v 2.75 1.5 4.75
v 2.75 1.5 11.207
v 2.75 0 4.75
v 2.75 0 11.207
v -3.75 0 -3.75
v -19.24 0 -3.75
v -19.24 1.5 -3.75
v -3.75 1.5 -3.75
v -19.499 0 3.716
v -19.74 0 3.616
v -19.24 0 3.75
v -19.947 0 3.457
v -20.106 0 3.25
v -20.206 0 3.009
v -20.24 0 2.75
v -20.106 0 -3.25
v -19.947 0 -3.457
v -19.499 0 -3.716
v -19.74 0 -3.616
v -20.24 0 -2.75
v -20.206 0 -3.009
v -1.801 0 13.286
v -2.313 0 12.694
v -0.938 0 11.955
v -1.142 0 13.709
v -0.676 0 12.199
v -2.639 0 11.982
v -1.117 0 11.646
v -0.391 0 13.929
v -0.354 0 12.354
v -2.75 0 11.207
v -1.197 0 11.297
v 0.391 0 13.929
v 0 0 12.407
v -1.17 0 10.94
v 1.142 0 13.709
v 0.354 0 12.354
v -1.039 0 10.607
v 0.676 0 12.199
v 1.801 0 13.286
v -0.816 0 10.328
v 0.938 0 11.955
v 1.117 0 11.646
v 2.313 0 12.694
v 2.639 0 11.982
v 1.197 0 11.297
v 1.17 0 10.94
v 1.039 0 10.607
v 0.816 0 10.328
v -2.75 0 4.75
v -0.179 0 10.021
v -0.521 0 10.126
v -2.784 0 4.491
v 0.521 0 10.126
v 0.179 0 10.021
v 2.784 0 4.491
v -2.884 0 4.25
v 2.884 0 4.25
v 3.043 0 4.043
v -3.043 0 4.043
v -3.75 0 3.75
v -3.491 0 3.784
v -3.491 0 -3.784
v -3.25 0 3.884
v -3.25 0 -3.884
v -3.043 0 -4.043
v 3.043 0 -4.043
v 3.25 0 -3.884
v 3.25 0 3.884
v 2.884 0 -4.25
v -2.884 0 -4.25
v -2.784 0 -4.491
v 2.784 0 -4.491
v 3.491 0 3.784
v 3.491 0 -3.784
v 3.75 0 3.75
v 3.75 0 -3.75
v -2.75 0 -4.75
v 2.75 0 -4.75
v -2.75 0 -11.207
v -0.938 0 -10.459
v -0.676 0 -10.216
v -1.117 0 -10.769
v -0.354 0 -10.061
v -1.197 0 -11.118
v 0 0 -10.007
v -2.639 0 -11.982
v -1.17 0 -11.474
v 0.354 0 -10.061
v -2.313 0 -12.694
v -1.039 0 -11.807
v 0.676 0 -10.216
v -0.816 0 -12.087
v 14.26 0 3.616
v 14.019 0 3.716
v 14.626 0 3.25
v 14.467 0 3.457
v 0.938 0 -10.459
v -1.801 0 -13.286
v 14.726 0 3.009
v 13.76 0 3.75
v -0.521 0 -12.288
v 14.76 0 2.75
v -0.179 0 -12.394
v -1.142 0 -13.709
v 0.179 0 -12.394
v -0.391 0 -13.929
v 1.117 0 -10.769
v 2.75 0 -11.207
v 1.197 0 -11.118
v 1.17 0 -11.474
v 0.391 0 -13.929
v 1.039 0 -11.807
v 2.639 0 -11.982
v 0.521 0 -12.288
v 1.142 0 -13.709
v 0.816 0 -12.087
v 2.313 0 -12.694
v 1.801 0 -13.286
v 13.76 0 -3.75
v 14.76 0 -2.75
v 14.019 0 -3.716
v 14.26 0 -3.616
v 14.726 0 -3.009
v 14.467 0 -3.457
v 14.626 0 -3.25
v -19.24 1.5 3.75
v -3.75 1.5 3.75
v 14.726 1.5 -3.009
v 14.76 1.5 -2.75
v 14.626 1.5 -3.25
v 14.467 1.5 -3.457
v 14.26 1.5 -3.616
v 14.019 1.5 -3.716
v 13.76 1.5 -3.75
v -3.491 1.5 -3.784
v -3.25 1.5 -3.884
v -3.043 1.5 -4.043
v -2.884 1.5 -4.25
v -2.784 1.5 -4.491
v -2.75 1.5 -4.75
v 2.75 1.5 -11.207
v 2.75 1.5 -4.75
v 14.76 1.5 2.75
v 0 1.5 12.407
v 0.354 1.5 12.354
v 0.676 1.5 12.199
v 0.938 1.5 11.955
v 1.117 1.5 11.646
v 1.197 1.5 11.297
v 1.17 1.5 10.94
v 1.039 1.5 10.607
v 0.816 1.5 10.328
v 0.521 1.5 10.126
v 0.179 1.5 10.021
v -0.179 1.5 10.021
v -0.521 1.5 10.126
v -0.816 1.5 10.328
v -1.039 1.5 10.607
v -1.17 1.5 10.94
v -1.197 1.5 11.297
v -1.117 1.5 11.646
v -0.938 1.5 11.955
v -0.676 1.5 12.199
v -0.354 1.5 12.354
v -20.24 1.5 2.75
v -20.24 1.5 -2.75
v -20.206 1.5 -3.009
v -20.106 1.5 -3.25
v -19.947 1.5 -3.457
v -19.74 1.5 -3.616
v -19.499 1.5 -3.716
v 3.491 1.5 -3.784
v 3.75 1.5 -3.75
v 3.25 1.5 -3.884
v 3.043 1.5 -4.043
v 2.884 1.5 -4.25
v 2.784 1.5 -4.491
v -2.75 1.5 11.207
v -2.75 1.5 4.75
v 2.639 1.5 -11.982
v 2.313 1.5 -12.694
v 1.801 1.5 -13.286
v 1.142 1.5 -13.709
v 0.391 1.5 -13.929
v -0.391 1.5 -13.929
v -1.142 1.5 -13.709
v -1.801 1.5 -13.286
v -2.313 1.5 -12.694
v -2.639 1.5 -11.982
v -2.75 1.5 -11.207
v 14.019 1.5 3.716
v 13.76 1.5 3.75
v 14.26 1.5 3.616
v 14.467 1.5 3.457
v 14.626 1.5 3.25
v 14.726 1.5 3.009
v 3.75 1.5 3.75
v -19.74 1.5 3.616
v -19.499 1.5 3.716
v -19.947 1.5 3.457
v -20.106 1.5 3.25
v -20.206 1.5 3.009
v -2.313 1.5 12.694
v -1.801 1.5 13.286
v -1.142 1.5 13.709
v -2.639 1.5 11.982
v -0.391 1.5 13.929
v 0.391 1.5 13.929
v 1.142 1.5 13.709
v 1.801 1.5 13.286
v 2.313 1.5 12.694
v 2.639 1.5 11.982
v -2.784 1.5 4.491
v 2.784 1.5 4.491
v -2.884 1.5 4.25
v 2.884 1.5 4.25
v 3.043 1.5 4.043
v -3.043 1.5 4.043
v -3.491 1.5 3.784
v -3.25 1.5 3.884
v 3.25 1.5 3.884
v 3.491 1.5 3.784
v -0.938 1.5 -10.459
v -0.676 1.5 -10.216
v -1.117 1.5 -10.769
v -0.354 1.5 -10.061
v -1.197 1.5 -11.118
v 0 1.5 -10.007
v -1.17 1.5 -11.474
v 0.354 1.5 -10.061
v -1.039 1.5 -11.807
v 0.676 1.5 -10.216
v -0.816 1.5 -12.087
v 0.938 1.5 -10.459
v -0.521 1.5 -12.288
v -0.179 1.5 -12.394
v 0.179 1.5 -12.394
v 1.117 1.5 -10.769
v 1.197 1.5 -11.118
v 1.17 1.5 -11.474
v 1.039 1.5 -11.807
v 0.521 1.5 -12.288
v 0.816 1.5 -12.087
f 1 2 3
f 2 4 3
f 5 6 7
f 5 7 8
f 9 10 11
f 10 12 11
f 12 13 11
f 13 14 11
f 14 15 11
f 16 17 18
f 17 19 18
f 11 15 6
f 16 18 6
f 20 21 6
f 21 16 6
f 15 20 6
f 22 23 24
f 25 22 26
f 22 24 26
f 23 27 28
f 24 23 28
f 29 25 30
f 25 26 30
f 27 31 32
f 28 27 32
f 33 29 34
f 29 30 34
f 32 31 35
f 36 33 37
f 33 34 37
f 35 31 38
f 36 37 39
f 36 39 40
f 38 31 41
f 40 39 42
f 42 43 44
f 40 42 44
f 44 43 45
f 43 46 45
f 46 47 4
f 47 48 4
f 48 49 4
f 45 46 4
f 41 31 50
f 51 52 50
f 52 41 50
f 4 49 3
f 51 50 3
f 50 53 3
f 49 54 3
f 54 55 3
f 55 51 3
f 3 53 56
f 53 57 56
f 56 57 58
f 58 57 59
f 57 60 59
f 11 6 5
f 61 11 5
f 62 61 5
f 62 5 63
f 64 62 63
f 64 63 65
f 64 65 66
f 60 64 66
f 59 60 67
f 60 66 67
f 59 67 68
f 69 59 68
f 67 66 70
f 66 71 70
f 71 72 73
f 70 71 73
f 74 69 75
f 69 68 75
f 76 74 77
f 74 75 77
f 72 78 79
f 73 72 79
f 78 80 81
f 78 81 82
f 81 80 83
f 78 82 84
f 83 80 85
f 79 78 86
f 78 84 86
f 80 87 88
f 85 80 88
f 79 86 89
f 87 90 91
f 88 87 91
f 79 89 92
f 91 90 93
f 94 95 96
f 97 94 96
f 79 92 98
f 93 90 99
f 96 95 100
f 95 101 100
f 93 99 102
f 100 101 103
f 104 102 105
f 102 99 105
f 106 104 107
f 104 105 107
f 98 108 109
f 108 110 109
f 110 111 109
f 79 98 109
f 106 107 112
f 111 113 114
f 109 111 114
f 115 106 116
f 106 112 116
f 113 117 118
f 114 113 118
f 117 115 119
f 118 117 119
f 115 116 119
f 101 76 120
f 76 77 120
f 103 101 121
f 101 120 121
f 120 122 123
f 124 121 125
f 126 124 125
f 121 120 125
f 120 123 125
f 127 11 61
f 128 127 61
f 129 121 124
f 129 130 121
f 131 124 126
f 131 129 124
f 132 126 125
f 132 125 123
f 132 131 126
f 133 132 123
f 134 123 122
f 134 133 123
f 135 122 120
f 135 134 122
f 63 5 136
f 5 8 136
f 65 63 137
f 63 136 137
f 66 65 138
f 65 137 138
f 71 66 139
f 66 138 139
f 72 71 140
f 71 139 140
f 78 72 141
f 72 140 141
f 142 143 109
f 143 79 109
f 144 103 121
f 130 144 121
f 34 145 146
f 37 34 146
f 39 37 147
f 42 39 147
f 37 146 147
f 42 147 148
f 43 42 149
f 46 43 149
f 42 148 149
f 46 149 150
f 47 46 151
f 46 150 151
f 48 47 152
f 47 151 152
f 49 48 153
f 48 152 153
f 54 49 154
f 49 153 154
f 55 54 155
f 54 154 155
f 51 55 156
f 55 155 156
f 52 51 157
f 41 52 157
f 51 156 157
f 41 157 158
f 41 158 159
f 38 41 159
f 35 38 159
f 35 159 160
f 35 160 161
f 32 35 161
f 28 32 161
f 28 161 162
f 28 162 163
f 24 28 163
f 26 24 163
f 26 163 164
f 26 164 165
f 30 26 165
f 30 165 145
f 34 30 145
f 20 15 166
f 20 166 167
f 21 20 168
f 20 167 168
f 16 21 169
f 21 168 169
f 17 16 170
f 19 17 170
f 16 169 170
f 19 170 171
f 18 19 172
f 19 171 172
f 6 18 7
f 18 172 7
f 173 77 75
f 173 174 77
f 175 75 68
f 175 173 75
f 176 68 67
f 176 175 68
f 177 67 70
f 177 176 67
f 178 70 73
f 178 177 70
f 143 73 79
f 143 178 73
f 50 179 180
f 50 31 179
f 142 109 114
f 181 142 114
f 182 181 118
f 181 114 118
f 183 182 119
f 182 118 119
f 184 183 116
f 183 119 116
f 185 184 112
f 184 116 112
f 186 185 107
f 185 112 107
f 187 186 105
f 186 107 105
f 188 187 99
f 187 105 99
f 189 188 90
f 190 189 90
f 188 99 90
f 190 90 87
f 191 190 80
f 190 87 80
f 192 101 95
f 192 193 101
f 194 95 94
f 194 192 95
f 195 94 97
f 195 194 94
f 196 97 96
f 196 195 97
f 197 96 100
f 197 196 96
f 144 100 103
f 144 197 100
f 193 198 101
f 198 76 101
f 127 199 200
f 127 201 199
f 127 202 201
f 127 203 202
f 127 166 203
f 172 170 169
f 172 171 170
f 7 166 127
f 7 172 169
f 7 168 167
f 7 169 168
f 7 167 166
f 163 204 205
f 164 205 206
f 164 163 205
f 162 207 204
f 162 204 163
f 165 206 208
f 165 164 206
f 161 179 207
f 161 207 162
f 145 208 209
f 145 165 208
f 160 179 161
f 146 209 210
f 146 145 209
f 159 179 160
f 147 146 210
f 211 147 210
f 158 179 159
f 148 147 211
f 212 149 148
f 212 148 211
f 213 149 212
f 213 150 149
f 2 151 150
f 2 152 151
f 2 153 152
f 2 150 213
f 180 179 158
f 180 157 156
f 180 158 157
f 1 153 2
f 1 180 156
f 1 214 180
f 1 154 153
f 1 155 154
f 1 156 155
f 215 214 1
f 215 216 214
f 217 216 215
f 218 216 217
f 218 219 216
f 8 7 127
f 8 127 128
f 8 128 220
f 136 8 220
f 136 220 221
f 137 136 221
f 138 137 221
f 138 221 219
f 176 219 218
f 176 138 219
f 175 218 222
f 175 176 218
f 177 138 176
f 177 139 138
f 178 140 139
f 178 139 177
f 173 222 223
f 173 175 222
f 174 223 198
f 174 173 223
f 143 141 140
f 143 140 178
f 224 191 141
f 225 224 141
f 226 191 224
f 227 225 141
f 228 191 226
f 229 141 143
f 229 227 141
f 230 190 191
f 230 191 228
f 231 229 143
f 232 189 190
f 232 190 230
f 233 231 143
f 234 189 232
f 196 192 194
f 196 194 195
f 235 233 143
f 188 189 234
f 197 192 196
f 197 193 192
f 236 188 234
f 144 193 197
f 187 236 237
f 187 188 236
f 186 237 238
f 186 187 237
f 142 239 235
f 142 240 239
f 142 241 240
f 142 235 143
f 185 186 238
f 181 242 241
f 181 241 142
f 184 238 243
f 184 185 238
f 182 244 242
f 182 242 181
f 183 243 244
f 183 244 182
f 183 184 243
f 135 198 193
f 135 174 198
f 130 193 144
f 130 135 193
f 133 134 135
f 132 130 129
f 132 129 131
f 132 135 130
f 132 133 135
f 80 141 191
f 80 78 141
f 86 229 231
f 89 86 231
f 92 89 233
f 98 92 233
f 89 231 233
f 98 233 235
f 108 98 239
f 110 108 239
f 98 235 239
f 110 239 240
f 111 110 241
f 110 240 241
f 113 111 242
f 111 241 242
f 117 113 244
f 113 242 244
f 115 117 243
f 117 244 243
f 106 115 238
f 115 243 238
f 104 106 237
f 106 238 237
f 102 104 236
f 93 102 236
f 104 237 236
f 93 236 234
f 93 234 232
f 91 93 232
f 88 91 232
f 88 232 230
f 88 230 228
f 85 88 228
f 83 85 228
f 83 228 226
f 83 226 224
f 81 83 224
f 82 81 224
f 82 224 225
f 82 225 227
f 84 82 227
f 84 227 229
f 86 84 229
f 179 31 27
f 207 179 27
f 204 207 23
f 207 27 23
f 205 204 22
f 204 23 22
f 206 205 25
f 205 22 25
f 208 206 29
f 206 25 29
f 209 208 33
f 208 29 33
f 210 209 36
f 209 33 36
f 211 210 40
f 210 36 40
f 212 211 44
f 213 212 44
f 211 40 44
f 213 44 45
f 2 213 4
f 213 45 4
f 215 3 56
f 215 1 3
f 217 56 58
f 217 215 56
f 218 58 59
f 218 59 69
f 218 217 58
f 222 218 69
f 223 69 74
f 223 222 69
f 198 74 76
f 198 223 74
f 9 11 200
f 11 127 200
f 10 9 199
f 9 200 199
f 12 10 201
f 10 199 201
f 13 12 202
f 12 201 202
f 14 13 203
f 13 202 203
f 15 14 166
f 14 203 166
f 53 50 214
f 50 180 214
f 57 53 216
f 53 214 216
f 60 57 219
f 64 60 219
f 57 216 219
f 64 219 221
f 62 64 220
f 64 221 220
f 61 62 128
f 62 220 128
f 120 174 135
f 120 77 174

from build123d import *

# Parameters (mm, degrees)
BOSS_EXTRUDE1_DEPTH  = 1.5
M2_CLEARANCE_HOLE1_D = 2.4
FILLET1_R            = 1


with BuildPart() as part:
    # Sketch1 → Boss-Extrude1 (new body)
    with BuildSketch(Plane(origin=(0, 0, 0), x_dir=(1, 0, 0), z_dir=(0, 1, 0))):
        with BuildLine():
            ThreePointArc((2.75, 11.2072), (0, 13.9572), (-2.75, 11.2072))
            Line((-2.75, 11.2072), (-2.75, 3.75))
            Line((-2.75, 3.75), (-20.24, 3.75))
            Line((-20.24, 3.75), (-20.24, -3.75))
            Line((-20.24, -3.75), (-2.75, -3.75))
            Line((-2.75, -3.75), (-2.75, -11.2072))
            ThreePointArc((-2.75, -11.2072), (0, -13.9572), (2.75, -11.2072))
            Line((2.75, -11.2072), (2.75, -3.75))
            Line((2.75, -3.75), (14.76, -3.75))
            Line((14.76, -3.75), (14.76, 3.75))
            Line((14.76, 3.75), (2.75, 3.75))
            Line((2.75, 3.75), (2.75, 11.2072))
        make_face()
    extrude(amount=BOSS_EXTRUDE1_DEPTH)

    # M2 Clearance Hole1 (through all)
    with Locations(Plane(origin=(0, 0, -11.2072), x_dir=(0, 0, -1), z_dir=(0, -1, 0))):
        with Locations((0, 0), (-22.4144, 0)):
            Hole(M2_CLEARANCE_HOLE1_D / 2)

    # Fillet1
    fillet1_edges = [part.edges().sort_by_distance(p)[0] for p in [
        (2.75, 0.75, -3.75),
        (14.76, 0.75, -3.75),
        (14.76, 0.75, 3.75),
        (-20.24, 0.75, 3.75),
        (-20.24, 0.75, -3.75),
        (-2.75, 0.75, -3.75),
        (-2.75, 0.75, 3.75),
        (2.75, 0.75, 3.75),
    ]]
    fillet(fillet1_edges, radius=FILLET1_R)


solid = part.part
